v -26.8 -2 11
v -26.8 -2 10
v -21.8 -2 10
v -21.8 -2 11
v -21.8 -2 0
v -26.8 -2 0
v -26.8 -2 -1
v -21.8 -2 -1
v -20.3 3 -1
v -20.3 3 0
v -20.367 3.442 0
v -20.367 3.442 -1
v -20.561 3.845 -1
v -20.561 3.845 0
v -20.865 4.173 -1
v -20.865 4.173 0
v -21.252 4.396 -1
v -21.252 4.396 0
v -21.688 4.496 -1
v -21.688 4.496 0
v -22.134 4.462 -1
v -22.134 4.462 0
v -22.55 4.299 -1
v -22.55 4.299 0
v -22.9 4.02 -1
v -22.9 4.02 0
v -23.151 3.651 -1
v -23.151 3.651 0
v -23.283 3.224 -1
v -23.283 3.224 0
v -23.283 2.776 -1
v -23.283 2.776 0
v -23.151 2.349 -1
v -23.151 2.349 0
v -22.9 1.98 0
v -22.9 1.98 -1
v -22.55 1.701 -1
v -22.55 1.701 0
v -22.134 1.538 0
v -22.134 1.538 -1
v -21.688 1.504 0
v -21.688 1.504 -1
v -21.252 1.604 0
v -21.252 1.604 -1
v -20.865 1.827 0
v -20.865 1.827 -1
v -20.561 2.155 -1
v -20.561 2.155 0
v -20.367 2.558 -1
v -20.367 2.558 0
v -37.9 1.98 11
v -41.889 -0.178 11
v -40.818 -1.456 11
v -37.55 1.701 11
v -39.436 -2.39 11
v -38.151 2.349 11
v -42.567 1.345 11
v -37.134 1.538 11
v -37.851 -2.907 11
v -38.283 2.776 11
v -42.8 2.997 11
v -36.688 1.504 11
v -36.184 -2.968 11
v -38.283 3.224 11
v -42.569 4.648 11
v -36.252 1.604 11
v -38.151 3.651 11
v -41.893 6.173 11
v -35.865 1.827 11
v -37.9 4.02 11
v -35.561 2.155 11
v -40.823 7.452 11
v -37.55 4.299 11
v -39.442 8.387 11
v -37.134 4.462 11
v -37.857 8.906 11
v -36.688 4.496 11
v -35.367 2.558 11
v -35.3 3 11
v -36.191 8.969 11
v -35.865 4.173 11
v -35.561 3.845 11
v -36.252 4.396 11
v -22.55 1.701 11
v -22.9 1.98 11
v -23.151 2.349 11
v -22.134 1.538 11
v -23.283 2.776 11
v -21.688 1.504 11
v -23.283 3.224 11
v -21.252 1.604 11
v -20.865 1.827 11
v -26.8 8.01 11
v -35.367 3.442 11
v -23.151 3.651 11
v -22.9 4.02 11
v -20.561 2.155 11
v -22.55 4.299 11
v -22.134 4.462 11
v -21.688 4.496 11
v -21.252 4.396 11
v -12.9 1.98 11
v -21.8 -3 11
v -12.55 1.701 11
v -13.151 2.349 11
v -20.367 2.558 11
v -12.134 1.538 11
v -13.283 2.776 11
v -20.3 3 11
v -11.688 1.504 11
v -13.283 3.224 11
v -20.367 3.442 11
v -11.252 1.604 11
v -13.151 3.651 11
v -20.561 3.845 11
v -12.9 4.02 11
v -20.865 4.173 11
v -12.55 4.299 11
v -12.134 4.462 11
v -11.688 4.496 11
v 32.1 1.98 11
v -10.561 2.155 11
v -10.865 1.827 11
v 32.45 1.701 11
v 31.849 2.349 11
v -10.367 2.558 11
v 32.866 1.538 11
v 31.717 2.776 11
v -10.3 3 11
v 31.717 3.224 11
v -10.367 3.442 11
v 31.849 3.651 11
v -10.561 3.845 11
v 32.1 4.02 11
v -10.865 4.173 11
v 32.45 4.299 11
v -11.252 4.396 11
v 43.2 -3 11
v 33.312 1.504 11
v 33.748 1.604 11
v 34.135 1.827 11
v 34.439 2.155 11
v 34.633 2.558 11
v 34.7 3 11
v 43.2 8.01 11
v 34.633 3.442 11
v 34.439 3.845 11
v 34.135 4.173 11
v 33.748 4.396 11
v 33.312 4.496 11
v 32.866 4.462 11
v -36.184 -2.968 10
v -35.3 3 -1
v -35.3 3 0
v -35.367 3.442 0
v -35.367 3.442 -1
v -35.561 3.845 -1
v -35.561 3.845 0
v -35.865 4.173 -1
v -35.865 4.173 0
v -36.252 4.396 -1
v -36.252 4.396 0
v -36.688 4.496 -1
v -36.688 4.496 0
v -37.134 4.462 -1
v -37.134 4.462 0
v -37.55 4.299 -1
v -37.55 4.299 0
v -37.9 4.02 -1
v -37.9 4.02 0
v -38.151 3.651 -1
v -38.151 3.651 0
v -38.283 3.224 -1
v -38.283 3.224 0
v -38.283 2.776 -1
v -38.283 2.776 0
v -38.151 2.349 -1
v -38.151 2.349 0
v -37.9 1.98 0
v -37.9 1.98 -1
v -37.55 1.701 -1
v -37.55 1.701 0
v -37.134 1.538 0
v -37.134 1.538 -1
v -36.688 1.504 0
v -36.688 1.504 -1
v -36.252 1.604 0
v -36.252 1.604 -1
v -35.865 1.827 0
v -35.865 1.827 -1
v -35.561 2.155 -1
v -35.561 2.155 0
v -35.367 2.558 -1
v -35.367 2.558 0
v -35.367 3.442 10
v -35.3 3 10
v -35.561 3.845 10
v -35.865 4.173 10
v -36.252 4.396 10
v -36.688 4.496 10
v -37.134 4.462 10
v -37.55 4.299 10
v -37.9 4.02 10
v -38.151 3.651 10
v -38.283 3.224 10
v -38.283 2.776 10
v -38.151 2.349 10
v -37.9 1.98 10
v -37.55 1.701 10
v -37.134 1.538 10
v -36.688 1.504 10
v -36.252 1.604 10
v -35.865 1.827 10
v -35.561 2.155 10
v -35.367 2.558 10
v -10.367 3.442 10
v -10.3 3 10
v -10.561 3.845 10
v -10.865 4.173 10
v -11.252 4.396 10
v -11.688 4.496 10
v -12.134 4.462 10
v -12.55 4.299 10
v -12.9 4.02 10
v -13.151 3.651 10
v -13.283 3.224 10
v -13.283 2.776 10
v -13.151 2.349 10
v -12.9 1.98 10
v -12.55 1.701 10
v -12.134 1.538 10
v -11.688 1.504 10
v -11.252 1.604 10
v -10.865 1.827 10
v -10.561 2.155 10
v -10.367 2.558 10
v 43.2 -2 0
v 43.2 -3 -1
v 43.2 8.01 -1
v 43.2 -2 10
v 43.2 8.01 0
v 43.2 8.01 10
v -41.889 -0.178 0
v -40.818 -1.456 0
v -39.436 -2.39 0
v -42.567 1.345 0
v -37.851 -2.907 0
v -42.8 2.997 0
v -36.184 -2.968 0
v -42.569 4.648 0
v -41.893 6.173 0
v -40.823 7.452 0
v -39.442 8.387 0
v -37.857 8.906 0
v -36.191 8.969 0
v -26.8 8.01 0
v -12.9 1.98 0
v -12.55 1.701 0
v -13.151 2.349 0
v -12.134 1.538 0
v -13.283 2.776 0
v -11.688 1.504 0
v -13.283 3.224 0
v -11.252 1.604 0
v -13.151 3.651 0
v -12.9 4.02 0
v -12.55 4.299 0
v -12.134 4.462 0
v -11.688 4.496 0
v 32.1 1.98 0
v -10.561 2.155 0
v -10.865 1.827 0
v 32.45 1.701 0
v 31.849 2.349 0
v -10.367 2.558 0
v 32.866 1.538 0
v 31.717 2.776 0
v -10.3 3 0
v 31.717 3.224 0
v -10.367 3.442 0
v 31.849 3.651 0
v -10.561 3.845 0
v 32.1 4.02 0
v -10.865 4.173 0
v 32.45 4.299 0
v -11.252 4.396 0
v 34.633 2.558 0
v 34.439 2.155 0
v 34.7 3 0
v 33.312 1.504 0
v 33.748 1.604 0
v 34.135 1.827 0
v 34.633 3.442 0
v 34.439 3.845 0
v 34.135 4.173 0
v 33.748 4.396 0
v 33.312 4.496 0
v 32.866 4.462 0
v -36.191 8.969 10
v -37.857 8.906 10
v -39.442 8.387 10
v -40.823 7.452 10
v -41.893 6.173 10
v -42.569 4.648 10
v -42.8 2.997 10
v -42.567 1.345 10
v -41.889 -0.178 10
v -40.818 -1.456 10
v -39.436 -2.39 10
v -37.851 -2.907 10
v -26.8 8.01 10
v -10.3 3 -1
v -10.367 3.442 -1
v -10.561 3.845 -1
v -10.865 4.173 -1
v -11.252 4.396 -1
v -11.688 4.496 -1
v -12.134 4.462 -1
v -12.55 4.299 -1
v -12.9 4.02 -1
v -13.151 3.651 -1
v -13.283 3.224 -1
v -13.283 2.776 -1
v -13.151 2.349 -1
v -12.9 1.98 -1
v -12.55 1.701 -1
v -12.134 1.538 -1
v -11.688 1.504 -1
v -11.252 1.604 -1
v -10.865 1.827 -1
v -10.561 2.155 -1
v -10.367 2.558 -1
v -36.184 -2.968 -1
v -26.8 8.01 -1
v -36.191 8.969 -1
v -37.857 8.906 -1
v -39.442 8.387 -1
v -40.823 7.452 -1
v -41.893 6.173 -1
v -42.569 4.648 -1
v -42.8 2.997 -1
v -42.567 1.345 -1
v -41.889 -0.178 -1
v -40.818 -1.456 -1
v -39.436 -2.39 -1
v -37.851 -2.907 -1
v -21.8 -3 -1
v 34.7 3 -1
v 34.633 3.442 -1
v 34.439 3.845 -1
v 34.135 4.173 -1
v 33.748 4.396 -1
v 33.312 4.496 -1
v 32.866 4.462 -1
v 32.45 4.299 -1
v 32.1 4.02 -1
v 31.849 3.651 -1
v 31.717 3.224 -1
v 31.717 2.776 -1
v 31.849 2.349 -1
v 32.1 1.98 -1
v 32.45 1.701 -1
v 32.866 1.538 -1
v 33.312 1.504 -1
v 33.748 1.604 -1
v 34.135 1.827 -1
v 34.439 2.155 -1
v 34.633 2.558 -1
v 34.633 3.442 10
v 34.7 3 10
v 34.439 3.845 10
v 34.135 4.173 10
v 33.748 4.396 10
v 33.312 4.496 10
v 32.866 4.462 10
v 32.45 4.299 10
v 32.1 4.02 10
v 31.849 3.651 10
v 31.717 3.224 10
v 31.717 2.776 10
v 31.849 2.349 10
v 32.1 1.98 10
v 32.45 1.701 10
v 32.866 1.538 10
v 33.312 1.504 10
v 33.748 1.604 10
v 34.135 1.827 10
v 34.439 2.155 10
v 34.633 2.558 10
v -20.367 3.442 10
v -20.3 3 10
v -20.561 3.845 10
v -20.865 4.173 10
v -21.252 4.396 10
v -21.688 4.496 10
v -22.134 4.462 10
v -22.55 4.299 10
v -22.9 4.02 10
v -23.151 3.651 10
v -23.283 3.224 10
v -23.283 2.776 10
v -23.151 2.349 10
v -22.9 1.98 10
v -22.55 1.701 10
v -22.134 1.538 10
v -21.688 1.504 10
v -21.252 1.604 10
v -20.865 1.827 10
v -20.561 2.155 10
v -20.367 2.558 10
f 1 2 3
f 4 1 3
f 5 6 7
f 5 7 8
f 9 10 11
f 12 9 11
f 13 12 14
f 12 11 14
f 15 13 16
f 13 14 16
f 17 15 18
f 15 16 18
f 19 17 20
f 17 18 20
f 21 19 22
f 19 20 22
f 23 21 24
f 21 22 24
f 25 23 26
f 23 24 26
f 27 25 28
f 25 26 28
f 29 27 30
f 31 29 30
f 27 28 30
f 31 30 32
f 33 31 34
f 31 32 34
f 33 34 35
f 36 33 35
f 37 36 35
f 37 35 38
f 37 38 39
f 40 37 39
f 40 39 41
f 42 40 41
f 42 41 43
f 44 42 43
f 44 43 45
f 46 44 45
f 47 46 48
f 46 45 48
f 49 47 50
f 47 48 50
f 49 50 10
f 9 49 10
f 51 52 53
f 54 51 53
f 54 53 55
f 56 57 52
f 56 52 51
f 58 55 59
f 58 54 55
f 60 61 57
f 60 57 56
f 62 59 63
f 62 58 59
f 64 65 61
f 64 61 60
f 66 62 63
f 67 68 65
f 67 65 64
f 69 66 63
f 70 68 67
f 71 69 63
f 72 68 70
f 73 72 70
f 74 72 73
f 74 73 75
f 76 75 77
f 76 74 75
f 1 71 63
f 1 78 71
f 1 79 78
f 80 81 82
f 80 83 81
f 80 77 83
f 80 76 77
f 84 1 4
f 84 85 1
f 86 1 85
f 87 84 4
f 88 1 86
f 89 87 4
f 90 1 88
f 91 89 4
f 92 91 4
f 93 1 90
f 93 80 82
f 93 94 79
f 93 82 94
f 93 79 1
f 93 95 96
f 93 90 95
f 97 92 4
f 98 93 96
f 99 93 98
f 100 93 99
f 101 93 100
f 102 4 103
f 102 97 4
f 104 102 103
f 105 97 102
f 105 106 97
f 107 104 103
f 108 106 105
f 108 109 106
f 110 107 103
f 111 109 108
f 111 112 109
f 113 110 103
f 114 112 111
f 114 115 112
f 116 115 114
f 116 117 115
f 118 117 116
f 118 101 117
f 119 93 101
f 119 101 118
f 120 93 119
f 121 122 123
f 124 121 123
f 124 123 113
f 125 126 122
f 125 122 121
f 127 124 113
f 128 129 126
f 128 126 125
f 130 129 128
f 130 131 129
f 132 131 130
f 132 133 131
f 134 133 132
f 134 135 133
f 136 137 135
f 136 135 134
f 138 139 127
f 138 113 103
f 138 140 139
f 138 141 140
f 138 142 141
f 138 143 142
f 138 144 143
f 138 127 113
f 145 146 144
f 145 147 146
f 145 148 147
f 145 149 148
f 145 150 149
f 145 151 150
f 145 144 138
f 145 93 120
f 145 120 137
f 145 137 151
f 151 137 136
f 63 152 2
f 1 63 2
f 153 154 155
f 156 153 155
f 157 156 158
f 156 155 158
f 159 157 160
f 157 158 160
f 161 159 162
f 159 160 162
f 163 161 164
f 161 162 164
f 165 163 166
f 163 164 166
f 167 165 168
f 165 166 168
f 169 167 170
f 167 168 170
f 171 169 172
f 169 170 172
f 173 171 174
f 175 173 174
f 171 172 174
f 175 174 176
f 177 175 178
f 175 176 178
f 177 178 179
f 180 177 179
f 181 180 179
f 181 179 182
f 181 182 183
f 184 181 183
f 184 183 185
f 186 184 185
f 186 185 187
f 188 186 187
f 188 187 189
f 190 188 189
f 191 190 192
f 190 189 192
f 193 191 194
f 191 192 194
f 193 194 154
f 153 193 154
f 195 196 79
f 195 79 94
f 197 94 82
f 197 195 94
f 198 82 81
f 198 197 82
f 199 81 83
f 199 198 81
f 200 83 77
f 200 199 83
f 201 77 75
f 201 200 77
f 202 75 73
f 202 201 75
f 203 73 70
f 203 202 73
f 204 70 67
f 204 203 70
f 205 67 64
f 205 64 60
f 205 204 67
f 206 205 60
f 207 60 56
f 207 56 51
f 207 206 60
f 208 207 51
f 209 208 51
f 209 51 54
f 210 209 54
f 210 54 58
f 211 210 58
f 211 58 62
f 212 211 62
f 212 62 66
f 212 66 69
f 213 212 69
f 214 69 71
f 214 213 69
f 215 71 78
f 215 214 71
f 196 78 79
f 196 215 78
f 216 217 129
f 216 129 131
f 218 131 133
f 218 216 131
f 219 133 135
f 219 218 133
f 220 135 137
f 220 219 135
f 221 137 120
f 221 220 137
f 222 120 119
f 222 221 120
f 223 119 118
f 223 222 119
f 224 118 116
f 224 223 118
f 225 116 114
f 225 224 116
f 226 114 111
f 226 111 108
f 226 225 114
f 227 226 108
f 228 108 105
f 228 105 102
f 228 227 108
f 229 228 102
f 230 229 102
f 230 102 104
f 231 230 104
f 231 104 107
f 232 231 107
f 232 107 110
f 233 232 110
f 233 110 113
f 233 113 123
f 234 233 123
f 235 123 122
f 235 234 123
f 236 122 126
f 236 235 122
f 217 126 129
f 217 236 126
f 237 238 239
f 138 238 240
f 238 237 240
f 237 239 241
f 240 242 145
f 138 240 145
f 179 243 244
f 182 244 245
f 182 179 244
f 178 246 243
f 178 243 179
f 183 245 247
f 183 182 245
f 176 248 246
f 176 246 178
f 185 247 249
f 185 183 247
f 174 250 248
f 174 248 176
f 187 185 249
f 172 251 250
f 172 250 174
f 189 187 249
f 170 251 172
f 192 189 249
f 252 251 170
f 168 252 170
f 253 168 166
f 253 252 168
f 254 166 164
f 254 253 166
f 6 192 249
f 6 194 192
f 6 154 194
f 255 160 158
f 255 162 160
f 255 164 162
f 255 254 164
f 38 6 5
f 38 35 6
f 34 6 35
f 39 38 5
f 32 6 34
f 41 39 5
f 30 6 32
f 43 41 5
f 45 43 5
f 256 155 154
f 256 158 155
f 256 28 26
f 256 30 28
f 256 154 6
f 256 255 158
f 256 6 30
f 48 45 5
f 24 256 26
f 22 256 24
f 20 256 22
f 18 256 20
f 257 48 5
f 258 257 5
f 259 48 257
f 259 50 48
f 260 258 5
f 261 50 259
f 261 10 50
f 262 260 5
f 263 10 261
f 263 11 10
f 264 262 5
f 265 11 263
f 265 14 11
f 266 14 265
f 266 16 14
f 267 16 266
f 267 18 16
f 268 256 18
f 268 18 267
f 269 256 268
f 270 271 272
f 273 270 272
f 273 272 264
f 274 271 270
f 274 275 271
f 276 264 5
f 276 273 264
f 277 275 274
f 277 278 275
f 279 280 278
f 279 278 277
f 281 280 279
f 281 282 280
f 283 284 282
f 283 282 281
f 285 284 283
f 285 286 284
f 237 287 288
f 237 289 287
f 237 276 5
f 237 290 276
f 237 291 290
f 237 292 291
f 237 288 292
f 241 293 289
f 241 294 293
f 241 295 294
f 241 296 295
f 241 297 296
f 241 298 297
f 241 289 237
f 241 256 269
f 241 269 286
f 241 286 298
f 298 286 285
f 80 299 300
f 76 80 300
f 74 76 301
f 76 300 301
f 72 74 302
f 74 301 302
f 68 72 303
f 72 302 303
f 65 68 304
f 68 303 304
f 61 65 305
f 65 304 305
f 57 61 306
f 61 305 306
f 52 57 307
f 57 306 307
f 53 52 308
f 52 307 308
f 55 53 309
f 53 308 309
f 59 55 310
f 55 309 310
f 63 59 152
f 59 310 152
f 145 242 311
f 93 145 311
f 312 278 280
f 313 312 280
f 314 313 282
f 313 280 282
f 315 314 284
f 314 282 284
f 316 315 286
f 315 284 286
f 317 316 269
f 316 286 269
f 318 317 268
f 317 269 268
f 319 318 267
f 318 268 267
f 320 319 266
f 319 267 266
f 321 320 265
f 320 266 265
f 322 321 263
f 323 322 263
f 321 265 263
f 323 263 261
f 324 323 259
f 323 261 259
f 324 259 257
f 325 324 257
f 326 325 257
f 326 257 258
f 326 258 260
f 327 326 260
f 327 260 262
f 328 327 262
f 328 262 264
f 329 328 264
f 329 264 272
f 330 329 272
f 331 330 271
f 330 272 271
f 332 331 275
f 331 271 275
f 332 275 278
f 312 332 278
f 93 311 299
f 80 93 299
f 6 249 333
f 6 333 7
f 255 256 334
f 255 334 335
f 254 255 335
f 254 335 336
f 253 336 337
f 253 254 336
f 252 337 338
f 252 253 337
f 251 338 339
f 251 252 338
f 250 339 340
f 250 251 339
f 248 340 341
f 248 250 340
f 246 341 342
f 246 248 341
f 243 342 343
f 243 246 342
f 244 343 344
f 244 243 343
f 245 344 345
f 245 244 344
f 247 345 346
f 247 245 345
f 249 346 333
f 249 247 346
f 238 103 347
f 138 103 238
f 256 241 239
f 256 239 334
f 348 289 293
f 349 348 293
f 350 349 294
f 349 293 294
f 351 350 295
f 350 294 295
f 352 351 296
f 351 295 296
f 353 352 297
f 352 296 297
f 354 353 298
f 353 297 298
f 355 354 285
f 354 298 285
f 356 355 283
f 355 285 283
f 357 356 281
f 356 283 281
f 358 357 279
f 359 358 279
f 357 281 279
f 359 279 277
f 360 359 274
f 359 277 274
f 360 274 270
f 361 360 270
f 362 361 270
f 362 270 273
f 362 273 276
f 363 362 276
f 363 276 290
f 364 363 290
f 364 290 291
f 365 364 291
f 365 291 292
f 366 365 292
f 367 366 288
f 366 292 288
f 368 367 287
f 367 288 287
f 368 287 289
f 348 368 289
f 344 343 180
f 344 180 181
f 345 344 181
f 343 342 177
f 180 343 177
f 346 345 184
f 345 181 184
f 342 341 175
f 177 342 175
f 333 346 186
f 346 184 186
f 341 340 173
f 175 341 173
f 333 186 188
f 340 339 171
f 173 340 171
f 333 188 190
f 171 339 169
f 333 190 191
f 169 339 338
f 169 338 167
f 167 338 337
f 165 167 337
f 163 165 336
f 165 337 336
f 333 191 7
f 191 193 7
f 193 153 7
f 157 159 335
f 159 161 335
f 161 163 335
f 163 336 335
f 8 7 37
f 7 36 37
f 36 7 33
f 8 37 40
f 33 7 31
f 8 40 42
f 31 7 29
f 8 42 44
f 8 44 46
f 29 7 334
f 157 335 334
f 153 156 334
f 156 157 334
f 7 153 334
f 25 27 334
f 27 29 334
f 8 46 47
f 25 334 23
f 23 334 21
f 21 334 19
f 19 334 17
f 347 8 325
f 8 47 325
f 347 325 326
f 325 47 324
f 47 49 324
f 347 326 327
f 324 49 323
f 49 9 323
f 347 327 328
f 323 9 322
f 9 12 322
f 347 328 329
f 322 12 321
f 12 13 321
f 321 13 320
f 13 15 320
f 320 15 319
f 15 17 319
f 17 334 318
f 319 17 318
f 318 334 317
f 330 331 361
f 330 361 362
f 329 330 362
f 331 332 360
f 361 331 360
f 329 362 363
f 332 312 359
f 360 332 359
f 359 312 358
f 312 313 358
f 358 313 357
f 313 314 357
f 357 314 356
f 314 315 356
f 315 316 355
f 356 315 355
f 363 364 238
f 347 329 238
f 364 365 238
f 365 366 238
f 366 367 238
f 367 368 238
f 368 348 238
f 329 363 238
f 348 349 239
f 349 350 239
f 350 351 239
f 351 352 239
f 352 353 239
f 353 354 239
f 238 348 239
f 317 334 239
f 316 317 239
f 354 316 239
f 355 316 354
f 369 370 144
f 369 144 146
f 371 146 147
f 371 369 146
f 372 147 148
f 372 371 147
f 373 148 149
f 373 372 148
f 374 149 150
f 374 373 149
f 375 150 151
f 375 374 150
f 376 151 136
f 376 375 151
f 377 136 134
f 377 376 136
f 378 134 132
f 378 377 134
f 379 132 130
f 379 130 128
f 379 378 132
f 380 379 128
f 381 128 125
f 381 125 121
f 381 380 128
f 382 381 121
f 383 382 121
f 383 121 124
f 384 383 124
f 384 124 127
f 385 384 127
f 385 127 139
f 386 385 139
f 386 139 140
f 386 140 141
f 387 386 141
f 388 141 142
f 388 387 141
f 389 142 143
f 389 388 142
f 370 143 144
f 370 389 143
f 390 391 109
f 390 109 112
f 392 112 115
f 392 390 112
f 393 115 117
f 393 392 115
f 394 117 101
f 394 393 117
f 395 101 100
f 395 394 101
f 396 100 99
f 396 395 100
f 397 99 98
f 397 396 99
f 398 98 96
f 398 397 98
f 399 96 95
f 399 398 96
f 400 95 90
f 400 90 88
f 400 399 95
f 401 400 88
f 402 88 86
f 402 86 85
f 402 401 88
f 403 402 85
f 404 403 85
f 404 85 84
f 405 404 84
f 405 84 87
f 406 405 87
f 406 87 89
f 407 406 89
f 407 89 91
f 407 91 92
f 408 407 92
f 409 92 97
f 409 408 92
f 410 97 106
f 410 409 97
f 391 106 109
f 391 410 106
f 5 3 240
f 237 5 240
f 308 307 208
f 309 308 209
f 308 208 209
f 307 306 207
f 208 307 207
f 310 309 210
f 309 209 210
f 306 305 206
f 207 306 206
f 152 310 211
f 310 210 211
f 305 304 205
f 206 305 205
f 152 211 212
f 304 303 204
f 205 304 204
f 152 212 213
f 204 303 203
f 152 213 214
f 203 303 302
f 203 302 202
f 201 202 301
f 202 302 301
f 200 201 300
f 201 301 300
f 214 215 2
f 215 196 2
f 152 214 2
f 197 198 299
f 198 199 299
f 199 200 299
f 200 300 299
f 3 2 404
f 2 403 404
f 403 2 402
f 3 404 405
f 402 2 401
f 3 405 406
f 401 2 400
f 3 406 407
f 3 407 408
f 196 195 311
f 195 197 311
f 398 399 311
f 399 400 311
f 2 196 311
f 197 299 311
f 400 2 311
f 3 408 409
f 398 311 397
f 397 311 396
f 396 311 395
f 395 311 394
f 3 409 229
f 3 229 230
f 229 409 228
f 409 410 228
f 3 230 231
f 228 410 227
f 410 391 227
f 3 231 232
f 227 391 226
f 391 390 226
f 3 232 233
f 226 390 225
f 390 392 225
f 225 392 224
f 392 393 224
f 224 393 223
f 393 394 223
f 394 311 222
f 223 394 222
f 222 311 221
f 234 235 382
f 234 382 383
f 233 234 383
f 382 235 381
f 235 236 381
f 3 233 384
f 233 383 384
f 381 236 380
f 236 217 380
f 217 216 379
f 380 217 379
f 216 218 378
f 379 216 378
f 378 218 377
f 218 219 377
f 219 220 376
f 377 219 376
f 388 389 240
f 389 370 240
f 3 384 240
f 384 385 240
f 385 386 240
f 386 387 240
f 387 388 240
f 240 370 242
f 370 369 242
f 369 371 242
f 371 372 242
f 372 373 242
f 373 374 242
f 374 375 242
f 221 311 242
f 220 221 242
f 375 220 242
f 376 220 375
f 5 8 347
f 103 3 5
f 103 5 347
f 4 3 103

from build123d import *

# Parameters (mm, degrees)
SKETCH_3_R      = 1.5
EXTRUDE_1_DEPTH = 1
SKETCH_1_R      = 1.5
EXTRUDE_2_DEPTH = 1
SKETCH_4_W      = 65
SKETCH_4_H      = 12
EXTRUDE_3_DEPTH = 1


with BuildPart() as part:
    # 草图3 → 凸台-拉伸1 (new body)
    with BuildSketch(Plane.XY.offset(10)):
        with BuildLine():
            Line((-26.8, 8.010393038), (-36.190694621, 8.96898207))
            ThreePointArc((-36.190694621, 8.96898207), (-42.7999991, 2.996713251), (-36.184155472, -2.968310943))
            Line((-36.184155472, -2.968310943), (-26.8, -2))
            Line((-26.8, -2), (43.2, -2))
            Line((43.2, -2), (43.2, 8.010393038))
            Line((43.2, 8.010393038), (-26.8, 8.010393038))
        make_face()
        with Locations((33.2, 3)):
            Circle(SKETCH_3_R, mode=Mode.SUBTRACT)
        with Locations((-11.8, 3)):
            Circle(SKETCH_3_R, mode=Mode.SUBTRACT)
        with Locations((-21.8, 3)):
            Circle(SKETCH_3_R, mode=Mode.SUBTRACT)
        with Locations((-36.8, 3)):
            Circle(SKETCH_3_R, mode=Mode.SUBTRACT)
    extrude(amount=EXTRUDE_1_DEPTH)



with BuildPart() as body_2:
    # 草图1 → 凸台-拉伸2 (new body)
    with BuildSketch(Plane.XY):
        with BuildLine():
            Line((43.2, 8.010393038), (-26.8, 8.010393038))
            Line((-26.8, 8.010393038), (-36.190694621, 8.96898207))
            ThreePointArc((-36.190694621, 8.96898207), (-42.7999991, 2.996713251), (-36.184155472, -2.968310943))
            Line((-36.184155472, -2.968310943), (-26.8, -2))
            Line((-26.8, -2), (43.2, -2))
            Line((43.2, -2), (43.2, 8.010393038))
        make_face()
        with Locations((-36.8, 3)):
            Circle(SKETCH_1_R, mode=Mode.SUBTRACT)
        with Locations((-21.8, 3)):
            Circle(SKETCH_1_R, mode=Mode.SUBTRACT)
        with Locations((-11.8, 3)):
            Circle(SKETCH_1_R, mode=Mode.SUBTRACT)
        with Locations((33.2, 3)):
            Circle(SKETCH_1_R, mode=Mode.SUBTRACT)
    extrude(amount=-EXTRUDE_2_DEPTH)


with BuildPart() as part_1:
    add(part.part)

    add(body_2.part)  # 凸台-拉伸3 merges body 2
    # 草图4 → 凸台-拉伸3 (add)
    with BuildSketch(Plane.XZ.offset(2)):
        with Locations((10.7, 5)):
            Rectangle(SKETCH_4_W, SKETCH_4_H)
    extrude(amount=EXTRUDE_3_DEPTH)


solid = part_1.part
